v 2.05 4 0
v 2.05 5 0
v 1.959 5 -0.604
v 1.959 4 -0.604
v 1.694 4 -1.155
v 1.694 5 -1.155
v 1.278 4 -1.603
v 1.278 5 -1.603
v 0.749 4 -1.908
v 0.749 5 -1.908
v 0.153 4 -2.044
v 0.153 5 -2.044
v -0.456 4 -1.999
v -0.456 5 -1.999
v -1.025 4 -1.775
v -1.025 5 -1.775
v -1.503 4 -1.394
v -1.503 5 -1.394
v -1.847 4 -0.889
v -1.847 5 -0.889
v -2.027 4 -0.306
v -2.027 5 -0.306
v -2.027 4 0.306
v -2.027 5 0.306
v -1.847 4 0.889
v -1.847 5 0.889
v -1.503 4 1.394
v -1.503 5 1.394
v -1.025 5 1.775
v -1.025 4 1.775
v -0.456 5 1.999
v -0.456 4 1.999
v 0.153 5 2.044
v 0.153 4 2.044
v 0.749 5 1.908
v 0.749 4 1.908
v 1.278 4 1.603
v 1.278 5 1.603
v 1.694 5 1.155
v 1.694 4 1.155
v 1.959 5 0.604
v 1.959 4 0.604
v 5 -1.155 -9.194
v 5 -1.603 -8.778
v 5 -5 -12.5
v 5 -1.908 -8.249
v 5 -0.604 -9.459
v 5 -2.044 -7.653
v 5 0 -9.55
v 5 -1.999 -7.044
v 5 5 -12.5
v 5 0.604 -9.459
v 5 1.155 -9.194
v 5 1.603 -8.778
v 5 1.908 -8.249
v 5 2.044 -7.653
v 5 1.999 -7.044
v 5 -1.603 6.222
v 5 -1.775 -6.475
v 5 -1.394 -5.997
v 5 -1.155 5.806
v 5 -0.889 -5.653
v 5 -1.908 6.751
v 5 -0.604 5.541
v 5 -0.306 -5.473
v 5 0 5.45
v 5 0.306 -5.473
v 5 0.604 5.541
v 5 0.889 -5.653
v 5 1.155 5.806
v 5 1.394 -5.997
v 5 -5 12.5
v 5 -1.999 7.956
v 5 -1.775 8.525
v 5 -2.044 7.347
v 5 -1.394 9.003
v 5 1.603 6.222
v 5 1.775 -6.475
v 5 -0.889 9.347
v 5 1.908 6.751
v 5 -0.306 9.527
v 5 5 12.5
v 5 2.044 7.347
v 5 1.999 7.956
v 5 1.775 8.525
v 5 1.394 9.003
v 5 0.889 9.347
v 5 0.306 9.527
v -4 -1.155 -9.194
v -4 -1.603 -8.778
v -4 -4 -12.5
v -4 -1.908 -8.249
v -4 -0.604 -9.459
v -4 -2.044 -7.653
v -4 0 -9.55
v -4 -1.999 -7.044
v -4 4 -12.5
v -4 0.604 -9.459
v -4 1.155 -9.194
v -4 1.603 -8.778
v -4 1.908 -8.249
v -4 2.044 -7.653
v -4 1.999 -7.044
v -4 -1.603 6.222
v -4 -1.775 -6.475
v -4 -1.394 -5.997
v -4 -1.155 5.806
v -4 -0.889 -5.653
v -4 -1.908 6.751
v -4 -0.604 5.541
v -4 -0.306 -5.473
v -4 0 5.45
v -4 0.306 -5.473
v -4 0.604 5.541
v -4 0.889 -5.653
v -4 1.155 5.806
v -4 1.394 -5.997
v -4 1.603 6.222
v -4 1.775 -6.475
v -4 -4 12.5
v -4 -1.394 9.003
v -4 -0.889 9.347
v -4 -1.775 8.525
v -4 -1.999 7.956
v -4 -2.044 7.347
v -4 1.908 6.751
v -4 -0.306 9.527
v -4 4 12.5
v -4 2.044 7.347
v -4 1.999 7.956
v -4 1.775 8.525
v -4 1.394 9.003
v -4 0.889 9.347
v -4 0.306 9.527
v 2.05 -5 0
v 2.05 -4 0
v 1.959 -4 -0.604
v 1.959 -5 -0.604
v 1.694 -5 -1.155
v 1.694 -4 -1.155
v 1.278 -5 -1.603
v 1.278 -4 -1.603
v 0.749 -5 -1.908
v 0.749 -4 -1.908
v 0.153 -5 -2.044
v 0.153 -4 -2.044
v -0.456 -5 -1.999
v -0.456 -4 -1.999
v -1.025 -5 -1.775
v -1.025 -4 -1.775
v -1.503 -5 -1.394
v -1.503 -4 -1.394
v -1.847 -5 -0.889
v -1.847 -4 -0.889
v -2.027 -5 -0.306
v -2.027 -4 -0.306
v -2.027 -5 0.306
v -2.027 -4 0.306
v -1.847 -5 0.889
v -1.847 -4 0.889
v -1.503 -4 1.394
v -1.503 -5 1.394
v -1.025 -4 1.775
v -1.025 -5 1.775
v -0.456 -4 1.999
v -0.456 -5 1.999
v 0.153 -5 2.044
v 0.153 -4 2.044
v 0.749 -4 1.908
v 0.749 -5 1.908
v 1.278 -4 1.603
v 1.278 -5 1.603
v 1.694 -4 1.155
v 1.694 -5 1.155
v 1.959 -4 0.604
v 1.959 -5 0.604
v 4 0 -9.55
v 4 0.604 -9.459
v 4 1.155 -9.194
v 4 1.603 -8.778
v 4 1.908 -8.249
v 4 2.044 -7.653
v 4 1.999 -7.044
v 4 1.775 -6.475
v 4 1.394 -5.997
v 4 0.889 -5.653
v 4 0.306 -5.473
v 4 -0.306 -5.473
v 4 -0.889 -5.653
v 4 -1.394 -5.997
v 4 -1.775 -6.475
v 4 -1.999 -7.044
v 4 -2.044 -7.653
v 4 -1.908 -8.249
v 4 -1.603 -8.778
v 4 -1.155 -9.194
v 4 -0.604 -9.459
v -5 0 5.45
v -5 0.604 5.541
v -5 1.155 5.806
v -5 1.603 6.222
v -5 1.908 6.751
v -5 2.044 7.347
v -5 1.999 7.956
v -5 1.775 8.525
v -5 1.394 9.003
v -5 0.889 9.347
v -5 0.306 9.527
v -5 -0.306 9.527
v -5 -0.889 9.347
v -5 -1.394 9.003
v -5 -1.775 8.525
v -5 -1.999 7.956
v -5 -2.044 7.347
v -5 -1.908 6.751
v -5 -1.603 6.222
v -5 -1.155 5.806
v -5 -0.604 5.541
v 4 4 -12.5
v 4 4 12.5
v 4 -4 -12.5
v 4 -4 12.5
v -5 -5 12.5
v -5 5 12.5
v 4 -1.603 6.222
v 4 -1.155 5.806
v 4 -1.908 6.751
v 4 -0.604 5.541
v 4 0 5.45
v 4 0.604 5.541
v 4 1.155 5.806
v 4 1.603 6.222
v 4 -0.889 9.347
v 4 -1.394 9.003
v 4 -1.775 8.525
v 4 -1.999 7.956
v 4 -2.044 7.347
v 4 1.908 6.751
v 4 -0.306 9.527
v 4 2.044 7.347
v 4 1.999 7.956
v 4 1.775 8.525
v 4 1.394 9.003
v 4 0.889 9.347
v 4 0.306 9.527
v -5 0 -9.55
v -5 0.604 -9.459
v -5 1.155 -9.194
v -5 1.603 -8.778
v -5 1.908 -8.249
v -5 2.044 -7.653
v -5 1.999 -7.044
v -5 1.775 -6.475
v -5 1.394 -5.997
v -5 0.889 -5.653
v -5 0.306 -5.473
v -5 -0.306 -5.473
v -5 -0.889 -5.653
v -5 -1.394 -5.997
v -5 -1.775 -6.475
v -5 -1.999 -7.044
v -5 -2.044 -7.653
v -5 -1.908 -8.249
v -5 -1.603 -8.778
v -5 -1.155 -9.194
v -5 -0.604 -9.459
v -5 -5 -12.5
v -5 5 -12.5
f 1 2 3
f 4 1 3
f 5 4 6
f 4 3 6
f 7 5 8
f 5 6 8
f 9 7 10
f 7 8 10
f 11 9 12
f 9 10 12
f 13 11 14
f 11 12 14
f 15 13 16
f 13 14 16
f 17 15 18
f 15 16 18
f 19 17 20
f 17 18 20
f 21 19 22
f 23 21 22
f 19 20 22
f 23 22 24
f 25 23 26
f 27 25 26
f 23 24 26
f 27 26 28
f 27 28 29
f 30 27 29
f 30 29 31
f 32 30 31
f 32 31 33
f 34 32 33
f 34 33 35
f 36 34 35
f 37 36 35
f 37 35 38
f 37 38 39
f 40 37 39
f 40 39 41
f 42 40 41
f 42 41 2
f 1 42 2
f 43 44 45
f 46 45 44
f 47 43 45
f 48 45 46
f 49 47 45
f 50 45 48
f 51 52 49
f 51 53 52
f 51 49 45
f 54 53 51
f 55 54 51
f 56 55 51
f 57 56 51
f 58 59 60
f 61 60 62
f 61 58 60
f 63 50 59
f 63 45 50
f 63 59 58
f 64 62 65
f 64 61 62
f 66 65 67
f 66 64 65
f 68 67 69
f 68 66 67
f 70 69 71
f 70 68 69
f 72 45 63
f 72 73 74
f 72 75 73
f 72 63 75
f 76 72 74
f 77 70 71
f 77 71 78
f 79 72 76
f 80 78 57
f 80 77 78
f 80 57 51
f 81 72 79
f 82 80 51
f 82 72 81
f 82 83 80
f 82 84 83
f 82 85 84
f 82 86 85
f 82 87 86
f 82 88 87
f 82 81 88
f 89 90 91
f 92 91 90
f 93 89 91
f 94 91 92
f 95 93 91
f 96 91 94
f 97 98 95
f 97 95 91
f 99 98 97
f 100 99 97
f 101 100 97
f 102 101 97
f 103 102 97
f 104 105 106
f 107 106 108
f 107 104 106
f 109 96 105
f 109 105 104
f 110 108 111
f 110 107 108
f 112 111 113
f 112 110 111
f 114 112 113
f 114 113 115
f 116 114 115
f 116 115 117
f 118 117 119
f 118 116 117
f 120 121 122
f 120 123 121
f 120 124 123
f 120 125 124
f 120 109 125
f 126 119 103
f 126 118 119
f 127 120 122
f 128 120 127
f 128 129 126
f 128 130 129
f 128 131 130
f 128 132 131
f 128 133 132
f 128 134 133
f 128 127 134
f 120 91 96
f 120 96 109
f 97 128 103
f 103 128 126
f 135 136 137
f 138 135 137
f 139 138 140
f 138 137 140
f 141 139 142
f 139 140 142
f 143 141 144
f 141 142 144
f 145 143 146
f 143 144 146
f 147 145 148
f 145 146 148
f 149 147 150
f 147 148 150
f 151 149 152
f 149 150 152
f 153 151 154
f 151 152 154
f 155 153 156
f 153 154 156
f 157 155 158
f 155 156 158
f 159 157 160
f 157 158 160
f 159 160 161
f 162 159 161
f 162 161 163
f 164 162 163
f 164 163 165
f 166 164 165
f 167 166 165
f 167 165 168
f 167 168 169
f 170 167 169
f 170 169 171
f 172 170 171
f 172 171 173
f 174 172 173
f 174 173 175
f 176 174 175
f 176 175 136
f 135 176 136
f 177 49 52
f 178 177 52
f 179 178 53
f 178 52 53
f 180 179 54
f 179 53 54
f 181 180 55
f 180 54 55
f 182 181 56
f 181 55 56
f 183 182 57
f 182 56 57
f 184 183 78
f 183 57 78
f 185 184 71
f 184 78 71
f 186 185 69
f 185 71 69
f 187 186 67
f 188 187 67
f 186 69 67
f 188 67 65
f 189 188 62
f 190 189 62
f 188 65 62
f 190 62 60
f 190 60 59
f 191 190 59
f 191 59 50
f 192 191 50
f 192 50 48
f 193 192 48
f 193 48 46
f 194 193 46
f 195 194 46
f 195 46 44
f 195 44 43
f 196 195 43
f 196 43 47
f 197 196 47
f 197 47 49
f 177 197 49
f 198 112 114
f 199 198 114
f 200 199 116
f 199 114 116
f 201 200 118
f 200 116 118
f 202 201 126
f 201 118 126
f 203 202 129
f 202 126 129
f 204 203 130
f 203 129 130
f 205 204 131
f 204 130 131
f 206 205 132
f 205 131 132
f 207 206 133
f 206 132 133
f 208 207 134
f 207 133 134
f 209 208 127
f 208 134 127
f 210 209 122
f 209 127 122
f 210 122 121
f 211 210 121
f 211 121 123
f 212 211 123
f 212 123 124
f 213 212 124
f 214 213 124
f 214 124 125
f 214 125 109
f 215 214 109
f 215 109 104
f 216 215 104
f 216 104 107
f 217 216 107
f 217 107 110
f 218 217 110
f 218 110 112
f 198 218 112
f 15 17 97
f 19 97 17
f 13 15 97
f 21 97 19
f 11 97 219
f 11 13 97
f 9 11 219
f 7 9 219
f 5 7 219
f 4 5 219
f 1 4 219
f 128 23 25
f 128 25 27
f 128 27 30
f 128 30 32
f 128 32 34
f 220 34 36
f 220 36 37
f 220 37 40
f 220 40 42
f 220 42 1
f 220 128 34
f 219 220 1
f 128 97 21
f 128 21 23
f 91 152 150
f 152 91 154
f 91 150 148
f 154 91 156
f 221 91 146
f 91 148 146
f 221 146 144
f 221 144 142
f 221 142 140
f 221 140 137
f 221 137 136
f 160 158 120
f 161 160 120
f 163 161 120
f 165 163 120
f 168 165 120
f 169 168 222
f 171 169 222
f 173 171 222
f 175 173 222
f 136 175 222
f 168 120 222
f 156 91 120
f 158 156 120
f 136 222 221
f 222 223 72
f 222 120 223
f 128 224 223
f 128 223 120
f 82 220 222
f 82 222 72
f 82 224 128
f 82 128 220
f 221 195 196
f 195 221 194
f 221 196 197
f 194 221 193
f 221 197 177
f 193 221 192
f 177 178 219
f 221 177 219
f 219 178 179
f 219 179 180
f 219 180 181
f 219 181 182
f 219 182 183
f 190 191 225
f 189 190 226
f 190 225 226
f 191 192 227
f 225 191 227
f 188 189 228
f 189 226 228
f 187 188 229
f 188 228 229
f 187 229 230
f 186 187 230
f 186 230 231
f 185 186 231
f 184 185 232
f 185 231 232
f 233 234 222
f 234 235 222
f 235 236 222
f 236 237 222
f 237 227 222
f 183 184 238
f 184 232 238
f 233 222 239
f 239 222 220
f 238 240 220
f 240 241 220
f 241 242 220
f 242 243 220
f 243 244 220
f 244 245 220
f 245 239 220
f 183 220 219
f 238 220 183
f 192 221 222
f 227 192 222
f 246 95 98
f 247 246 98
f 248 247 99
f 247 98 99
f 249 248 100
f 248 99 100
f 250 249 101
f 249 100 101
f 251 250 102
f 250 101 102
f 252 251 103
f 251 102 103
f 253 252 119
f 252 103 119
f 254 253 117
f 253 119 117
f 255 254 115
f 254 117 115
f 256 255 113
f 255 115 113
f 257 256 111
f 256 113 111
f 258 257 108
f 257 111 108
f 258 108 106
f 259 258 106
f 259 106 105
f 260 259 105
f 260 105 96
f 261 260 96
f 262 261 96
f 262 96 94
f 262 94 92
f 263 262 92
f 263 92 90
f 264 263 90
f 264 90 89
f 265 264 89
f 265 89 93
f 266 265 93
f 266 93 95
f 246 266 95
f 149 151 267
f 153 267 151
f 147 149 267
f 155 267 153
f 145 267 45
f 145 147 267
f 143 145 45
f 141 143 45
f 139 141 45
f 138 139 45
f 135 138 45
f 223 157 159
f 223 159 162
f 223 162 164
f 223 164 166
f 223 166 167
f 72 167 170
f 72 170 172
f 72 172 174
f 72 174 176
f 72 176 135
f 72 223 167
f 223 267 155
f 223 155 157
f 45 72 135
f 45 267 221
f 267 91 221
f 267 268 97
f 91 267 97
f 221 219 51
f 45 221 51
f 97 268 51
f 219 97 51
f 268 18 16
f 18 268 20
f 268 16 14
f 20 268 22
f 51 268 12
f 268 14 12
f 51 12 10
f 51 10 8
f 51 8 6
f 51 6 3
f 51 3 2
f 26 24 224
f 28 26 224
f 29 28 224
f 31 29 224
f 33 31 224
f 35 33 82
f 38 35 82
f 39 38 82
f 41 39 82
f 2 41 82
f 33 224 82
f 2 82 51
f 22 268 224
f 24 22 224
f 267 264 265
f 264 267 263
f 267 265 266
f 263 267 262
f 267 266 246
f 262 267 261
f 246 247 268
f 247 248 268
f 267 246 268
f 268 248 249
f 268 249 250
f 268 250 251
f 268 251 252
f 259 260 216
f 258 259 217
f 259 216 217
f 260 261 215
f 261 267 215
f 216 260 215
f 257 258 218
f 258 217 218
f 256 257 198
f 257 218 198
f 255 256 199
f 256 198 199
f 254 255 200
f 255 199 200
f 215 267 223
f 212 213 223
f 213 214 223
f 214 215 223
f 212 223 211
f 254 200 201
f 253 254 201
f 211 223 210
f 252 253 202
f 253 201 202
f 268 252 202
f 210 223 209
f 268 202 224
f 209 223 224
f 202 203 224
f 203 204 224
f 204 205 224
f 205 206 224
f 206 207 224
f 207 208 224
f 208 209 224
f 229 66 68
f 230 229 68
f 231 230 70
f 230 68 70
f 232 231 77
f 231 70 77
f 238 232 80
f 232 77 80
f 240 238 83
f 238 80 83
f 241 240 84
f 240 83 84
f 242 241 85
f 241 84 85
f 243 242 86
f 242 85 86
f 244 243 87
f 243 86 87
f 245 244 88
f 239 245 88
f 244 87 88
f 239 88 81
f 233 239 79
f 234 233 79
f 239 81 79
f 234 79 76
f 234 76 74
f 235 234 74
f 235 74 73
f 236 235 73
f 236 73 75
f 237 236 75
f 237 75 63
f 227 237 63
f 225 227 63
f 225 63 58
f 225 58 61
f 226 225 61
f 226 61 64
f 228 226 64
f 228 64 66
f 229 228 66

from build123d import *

# Parameters (mm, degrees)
SKETCH_1_W          = 10
SKETCH_1_H          = 10
SKETCH_1_W_2        = 8
SKETCH_1_H_2        = 8
EXTRUDE_1_DEPTH     = 12.5
SKETCH_2_R          = 2.05
CUT_EXTRUDE_1_DEPTH = 11
SKETCH_3_R          = 2.05
CUT_EXTRUDE_2_DEPTH = 11


with BuildPart() as part:
    # 草图1 → 凸台-拉伸1 (new body, symmetric)
    with BuildSketch(Plane.XY):
        Rectangle(SKETCH_1_W, SKETCH_1_H)
        Rectangle(SKETCH_1_W_2, SKETCH_1_H_2, mode=Mode.SUBTRACT)
    extrude(amount=EXTRUDE_1_DEPTH, both=True)

    # 草图2 → 切除-拉伸1 (cut, through all)
    with BuildSketch(Plane(origin=(0, 5, 0), x_dir=(1, 0, 0), z_dir=(0, 1, 0))):
        Circle(SKETCH_2_R)
    extrude(amount=-CUT_EXTRUDE_1_DEPTH, mode=Mode.SUBTRACT)

    # 草图3 → 切除-拉伸2 (cut, through all)
    with BuildSketch(Plane(origin=(5, 0, 0), x_dir=(0, 0, -1), z_dir=(1, 0, 0))):
        with Locations((-7.5, 0)):
            Circle(SKETCH_3_R)
        with Locations((7.5, 0)):
            Circle(SKETCH_3_R)
    extrude(amount=-CUT_EXTRUDE_2_DEPTH, mode=Mode.SUBTRACT)


solid = part.part
